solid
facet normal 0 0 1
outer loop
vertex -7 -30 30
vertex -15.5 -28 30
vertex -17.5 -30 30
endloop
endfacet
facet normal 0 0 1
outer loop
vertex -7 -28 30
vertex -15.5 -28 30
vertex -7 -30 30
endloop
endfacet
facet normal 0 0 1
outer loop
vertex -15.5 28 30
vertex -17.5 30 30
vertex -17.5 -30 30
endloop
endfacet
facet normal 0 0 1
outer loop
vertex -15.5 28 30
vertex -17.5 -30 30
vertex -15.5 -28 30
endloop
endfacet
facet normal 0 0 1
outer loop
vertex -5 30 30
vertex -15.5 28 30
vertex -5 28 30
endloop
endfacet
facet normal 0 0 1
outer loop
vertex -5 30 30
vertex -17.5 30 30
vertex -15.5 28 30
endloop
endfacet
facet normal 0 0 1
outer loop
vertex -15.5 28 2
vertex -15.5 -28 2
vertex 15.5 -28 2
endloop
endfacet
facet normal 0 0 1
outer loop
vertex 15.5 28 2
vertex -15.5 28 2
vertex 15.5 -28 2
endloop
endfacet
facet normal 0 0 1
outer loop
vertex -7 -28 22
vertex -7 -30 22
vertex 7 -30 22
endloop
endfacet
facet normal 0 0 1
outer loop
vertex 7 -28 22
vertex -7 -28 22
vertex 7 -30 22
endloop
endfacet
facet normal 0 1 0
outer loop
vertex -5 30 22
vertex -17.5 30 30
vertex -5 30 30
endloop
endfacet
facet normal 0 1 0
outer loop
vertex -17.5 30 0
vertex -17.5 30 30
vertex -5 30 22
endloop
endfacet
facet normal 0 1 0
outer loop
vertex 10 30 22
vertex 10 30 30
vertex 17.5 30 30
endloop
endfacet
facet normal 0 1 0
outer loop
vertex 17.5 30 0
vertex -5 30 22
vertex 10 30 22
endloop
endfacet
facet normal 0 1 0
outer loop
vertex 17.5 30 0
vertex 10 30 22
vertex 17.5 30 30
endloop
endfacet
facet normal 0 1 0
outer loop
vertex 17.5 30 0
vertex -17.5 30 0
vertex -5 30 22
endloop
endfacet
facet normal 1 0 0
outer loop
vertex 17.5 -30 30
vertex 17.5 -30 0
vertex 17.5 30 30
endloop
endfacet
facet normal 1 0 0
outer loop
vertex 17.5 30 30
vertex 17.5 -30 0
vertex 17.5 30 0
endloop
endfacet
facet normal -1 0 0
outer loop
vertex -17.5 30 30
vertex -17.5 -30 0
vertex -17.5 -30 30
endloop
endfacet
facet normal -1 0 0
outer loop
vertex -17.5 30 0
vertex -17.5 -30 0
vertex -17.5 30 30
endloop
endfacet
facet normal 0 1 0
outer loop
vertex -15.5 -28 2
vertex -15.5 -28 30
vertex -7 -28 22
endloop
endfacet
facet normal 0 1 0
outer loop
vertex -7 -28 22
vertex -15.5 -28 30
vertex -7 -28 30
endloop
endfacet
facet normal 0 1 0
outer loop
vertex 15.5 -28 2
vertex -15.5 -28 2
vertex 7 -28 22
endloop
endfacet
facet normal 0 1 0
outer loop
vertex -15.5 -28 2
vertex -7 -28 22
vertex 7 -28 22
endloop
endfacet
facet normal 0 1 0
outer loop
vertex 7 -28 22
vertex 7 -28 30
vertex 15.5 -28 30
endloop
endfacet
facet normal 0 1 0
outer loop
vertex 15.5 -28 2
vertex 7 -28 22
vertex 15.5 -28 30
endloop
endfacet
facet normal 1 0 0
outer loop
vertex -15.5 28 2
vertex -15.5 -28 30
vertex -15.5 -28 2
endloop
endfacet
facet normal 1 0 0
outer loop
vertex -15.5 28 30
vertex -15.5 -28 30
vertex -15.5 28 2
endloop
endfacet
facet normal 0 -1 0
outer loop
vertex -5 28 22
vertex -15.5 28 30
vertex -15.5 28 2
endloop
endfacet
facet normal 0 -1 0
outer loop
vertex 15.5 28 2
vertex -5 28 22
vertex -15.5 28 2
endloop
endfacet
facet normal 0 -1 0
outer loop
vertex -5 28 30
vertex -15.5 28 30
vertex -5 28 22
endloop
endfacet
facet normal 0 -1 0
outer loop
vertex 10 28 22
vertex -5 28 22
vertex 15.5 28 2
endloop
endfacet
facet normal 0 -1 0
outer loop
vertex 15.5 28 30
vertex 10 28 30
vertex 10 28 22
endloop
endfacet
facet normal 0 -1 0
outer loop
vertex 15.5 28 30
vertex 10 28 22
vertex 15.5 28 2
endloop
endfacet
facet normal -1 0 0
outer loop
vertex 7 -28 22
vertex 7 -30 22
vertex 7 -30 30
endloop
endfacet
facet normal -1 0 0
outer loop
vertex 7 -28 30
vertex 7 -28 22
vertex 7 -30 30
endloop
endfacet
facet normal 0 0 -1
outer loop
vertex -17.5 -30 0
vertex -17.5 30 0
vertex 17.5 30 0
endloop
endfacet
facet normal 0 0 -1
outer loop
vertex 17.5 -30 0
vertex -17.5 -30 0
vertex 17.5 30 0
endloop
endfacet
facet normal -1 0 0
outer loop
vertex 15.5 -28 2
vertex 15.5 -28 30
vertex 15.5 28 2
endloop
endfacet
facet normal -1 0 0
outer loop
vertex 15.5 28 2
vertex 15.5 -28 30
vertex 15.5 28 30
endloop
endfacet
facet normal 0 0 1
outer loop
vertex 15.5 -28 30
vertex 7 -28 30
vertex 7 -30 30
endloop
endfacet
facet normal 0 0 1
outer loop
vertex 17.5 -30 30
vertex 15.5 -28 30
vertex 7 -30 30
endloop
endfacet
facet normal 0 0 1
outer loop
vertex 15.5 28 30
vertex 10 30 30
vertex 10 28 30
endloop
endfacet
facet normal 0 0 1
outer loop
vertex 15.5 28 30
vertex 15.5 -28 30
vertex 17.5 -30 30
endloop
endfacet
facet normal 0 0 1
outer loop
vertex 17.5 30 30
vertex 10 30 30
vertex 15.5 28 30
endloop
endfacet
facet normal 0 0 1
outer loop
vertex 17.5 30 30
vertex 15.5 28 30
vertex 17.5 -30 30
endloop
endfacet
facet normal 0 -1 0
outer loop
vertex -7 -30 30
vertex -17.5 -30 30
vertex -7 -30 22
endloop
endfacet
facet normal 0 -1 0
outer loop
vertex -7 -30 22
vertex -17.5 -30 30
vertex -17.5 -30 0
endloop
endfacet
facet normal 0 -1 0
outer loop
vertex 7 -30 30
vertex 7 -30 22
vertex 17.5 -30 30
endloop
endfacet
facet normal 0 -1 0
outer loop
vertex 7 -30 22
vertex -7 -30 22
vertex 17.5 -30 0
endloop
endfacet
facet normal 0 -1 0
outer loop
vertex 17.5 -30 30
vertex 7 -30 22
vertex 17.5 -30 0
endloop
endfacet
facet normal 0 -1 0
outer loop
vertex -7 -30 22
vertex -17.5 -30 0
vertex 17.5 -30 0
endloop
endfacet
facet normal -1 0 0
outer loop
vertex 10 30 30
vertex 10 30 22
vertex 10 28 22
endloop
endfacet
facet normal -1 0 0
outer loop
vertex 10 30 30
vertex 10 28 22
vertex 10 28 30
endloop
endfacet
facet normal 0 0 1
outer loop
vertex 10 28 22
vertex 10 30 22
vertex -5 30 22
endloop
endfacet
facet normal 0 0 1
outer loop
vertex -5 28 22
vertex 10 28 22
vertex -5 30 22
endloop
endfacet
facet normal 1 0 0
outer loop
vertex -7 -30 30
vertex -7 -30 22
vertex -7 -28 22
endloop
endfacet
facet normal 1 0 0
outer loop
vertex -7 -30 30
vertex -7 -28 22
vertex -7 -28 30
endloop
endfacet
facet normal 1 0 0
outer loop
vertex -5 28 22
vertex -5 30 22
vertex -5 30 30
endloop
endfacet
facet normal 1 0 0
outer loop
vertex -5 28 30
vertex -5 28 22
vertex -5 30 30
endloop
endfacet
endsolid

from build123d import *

# Parameters (mm, degrees)
F0_W     = 35
F0_H     = 60
F1_DEPTH = 30
F2_W     = 31
F2_H     = 56
F3_DEPTH = 28
F4_W     = 5
F4_H     = 8
F4_W_2   = 10
F5_DEPTH = 2
F6_W     = 7
F6_H     = 8
F7_DEPTH = 2


with BuildPart() as f1:
    # F0 (on Top) → F1 (new body)
    with BuildSketch(Plane.XY):
        Rectangle(F0_W, F0_H)
    extrude(amount=F1_DEPTH)

    # F2 (on face) → F3 (cut)
    with BuildSketch(Plane.XY.offset(30)):
        Rectangle(F2_W, F2_H)
    extrude(amount=-F3_DEPTH, mode=Mode.SUBTRACT)

    # F4 (on face) → F5 (cut)
    with BuildSketch(Plane(origin=(0, 30, 0), x_dir=(-1, 0, 0), z_dir=(0, 1, 0))):
        with Locations((2.5, 26)):
            Rectangle(F4_W, F4_H)
        with Locations((-5, 26)):
            Rectangle(F4_W_2, F4_H)
    extrude(amount=-F5_DEPTH, mode=Mode.SUBTRACT)

    # F6 (on face) → F7 (cut)
    with BuildSketch(Plane.XZ.offset(30)):
        with Locations((-3.5, 26)):
            Rectangle(F6_W, F6_H)
        with Locations((3.5, 26)):
            Rectangle(F6_W, F6_H)
    extrude(amount=-F7_DEPTH, mode=Mode.SUBTRACT)


solid = f1.part
